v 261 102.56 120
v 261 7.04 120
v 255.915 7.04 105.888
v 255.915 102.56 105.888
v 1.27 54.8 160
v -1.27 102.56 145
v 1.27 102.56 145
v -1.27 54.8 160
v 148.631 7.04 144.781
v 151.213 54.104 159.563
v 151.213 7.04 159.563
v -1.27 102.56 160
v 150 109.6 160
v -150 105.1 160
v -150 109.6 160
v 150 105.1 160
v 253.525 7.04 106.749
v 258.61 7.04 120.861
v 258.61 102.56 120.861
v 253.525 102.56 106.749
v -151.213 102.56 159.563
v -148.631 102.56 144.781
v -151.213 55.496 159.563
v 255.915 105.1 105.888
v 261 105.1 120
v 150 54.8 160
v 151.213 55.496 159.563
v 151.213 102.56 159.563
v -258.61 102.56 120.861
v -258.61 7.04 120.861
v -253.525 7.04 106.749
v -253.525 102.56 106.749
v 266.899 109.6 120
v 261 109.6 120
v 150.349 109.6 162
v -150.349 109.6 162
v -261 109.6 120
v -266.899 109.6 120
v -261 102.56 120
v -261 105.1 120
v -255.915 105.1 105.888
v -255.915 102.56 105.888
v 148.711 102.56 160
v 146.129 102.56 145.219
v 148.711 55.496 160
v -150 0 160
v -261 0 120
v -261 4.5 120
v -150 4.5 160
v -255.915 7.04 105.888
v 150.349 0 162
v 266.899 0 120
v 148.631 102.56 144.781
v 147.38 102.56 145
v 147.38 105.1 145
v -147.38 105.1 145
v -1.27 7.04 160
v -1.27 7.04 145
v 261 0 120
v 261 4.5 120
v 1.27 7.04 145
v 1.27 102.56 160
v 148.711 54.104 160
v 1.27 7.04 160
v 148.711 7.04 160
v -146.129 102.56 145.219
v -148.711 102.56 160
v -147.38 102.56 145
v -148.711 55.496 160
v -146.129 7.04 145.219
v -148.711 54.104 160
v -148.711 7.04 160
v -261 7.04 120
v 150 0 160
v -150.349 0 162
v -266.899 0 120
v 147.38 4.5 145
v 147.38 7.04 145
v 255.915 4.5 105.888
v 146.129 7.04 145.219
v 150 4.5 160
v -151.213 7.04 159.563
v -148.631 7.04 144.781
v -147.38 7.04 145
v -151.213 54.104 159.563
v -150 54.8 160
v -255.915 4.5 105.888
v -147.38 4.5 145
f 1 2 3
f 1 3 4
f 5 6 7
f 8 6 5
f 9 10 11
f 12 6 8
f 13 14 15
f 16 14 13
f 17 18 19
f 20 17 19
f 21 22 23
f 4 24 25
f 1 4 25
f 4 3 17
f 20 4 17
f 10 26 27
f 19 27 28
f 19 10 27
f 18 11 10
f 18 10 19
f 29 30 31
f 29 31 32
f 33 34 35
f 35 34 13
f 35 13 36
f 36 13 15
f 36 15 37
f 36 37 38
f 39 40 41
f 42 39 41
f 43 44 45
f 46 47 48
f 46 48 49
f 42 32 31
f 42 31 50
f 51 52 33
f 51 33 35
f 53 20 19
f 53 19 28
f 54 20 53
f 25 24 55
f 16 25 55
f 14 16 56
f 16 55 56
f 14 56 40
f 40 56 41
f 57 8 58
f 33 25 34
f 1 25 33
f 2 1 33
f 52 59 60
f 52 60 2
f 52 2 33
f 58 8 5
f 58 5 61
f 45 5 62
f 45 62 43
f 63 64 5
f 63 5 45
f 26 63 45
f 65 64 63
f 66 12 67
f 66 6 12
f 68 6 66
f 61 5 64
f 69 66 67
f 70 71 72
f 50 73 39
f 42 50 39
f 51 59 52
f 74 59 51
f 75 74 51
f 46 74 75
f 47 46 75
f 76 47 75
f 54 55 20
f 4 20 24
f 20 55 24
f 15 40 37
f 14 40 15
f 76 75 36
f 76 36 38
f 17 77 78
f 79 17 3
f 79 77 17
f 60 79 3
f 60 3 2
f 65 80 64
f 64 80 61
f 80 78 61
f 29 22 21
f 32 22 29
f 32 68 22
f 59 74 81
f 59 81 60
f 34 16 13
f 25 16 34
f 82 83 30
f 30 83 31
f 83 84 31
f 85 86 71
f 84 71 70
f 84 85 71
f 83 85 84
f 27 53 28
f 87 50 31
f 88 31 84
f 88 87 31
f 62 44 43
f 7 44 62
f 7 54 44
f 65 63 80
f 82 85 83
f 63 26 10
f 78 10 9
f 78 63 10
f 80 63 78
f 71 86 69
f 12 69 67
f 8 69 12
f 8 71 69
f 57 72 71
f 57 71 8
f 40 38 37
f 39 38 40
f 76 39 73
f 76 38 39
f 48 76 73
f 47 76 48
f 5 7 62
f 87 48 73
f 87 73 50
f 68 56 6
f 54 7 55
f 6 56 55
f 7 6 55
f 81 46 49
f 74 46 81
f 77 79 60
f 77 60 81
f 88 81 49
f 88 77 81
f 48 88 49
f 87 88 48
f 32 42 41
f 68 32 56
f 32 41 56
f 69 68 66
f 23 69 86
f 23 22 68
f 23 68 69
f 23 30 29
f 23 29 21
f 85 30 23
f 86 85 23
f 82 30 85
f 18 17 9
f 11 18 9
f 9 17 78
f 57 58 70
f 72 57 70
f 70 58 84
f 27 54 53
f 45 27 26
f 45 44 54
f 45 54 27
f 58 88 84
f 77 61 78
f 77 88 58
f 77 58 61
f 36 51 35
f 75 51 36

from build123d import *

# Parameters (mm, degrees)
BOSS_EXTRUDE1_DEPTH = 109.600000002
BOSS_EXTRUDE2_DEPTH = 2.54
BOSS_EXTRUDE3_DEPTH = 2.54
RIB2_REACH          = 442.308
SKETCH5_WALL_W      = 932.745237508
SKETCH5_WALL_H      = 2.54
RIB3_REACH          = 442.308
SKETCH6_WALL_W      = 932.745237508
SKETCH6_WALL_H      = 2.54
RIB4_REACH          = 442.308
SKETCH7_WALL_W      = 932.745237508
SKETCH7_WALL_H      = 2.54
RIB5_REACH          = 442.308
SKETCH8_WALL_W      = 932.745237508
SKETCH8_WALL_H      = 2.54
RIB6_REACH          = 332.895
SKETCH13_WALL_W     = 713.849927416
SKETCH13_WALL_H     = 2.54
RIB7_REACH          = 332.895
SKETCH14_WALL_W     = 713.849927416
SKETCH14_WALL_H     = 2.54
SKETCH15_W          = 2.54
SKETCH15_H          = 95.520000222
BOSS_EXTRUDE4_DEPTH = 15
SKETCH16_W          = 2.54
SKETCH16_H          = 95.520000222
BOSS_EXTRUDE5_DEPTH = 15


with BuildPart() as part:
    # Sketch1 → Boss-Extrude1 (new body)
    with BuildSketch(Plane(origin=(0, 0, 0), x_dir=(1, 0, 0), z_dir=(0, 1, 0))):
        Polygon((-261, -120), (-150, -160), (150, -160), (261, -120), (266.899364373, -120), (150.349364373, -162), (-150.349364373, -162), (-266.899364373, -120), align=None)
    extrude(amount=BOSS_EXTRUDE1_DEPTH)

    # Sketch2 → Boss-Extrude2 (add)
    with BuildSketch(Plane(origin=(0, 4.49999989, 0), x_dir=(1, 0, 0), z_dir=(0, 1, 0))):
        Polygon((147.379767206, -145), (255.914706381, -105.888310207), (261, -120), (150, -160), (-150, -160), (-261, -120), (-255.914706381, -105.888310207), (-147.379767206, -145), align=None)
    extrude(amount=BOSS_EXTRUDE2_DEPTH)

    # Sketch4 → Boss-Extrude3 (add)
    with BuildSketch(Plane(origin=(0, 105.100000112, 0), x_dir=(1, 0, 0), z_dir=(0, 1, 0))):
        Polygon((-255.914706381, -105.888310207), (-147.379767206, -145), (147.379767206, -145), (255.914706381, -105.888310207), (261, -120), (150, -160), (-150, -160), (-261, -120), align=None)
    extrude(amount=-BOSS_EXTRUDE3_DEPTH)

    # Sketch5 wall → Rib2 (add, up to next)
    with BuildSketch(Plane(origin=(-148.689883603, 78.680000057, 152.5), x_dir=(-0.052270147277, -0.952748261703, 0.299229980995), z_dir=(0.163945637159, -0.303761007739, -0.938536668561)), mode=Mode.PRIVATE) as rib2_sk1:
        Rectangle(SKETCH5_WALL_W, SKETCH5_WALL_H)
    rib2_tool1 = extrude(rib2_sk1.sketch, amount=-RIB2_REACH, mode=Mode.PRIVATE) - part.part
    add(rib2_tool1.solids().sort_by_distance((-148.689883603, 78.680000057, 152.5))[0])

    # Sketch6 wall → Rib3 (add, up to next)
    with BuildSketch(Plane(origin=(-148.689883603, 30.919999945, 152.5), x_dir=(0.052270147277, -0.952748261703, -0.299229980995), z_dir=(0.163945637159, 0.303761007739, -0.938536668561)), mode=Mode.PRIVATE) as rib3_sk1:
        Rectangle(SKETCH6_WALL_W, SKETCH6_WALL_H)
    rib3_tool1 = extrude(rib3_sk1.sketch, amount=-RIB3_REACH, mode=Mode.PRIVATE) - part.part
    add(rib3_tool1.solids().sort_by_distance((-148.689883603, 30.919999945, 152.5))[0])

    # Sketch7 wall → Rib4 (add, up to next)
    with BuildSketch(Plane(origin=(148.689883603, 78.680000057, 152.5), x_dir=(0.052270147277, -0.952748261703, 0.299229980995), z_dir=(-0.163945637159, -0.303761007739, -0.938536668561)), mode=Mode.PRIVATE) as rib4_sk1:
        Rectangle(SKETCH7_WALL_W, SKETCH7_WALL_H)
    rib4_tool1 = extrude(rib4_sk1.sketch, amount=-RIB4_REACH, mode=Mode.PRIVATE) - part.part
    add(rib4_tool1.solids().sort_by_distance((148.689883603, 78.680000057, 152.5))[0])

    # Sketch8 wall → Rib5 (add, up to next)
    with BuildSketch(Plane(origin=(148.689883603, 30.919999945, 152.5), x_dir=(-0.052270147277, -0.952748261703, -0.299229980995), z_dir=(-0.163945637159, 0.303761007739, -0.938536668561)), mode=Mode.PRIVATE) as rib5_sk1:
        Rectangle(SKETCH8_WALL_W, SKETCH8_WALL_H)
    rib5_tool1 = extrude(rib5_sk1.sketch, amount=-RIB5_REACH, mode=Mode.PRIVATE) - part.part
    add(rib5_tool1.solids().sort_by_distance((148.689883603, 30.919999945, 152.5))[0])

    # Sketch13 wall → Rib6 (add, up to next)
    with BuildSketch(Plane(origin=(0, 78.680000057, 152.5), x_dir=(0, -0.954052469095, 0.299639593869), z_dir=(0, -0.299639593869, -0.954052469095)), mode=Mode.PRIVATE) as rib6_sk1:
        Rectangle(SKETCH13_WALL_W, SKETCH13_WALL_H)
    rib6_tool1 = extrude(rib6_sk1.sketch, amount=-RIB6_REACH, mode=Mode.PRIVATE) - part.part
    add(rib6_tool1.solids().sort_by_distance((0, 78.680000057, 152.5))[0])

    # Sketch14 wall → Rib7 (add, up to next)
    with BuildSketch(Plane(origin=(0, 30.919999945, 152.5), x_dir=(0, -0.954052469095, -0.299639593869), z_dir=(0, 0.299639593869, -0.954052469095)), mode=Mode.PRIVATE) as rib7_sk1:
        Rectangle(SKETCH14_WALL_W, SKETCH14_WALL_H)
    rib7_tool1 = extrude(rib7_sk1.sketch, amount=-RIB7_REACH, mode=Mode.PRIVATE) - part.part
    add(rib7_tool1.solids().sort_by_distance((0, 30.919999945, 152.5))[0])

    # Sketch15 → Boss-Extrude4 (add)
    with BuildSketch(Plane(origin=(68.270957546, 0, 189.451907191), x_dir=(-0.9407793195201408, 0, 0.33901957460185245), z_dir=(-0.3390195746018524, 0, -0.9407793195201407))):
        with Locations((-203.591053443, 54.800000001)):
            Rectangle(SKETCH15_W, SKETCH15_H)
    extrude(amount=BOSS_EXTRUDE4_DEPTH)

    # Sketch16 → Boss-Extrude5 (add)
    with BuildSketch(Plane(origin=(-68.270957546, 0, 189.451907191), x_dir=(-0.9407793195201407, 0, -0.3390195746018526), z_dir=(0.3390195746018526, 0, -0.9407793195201408))):
        with Locations((203.591053443, 54.800000001)):
            Rectangle(SKETCH16_W, SKETCH16_H)
    extrude(amount=BOSS_EXTRUDE5_DEPTH)


solid = part.part
